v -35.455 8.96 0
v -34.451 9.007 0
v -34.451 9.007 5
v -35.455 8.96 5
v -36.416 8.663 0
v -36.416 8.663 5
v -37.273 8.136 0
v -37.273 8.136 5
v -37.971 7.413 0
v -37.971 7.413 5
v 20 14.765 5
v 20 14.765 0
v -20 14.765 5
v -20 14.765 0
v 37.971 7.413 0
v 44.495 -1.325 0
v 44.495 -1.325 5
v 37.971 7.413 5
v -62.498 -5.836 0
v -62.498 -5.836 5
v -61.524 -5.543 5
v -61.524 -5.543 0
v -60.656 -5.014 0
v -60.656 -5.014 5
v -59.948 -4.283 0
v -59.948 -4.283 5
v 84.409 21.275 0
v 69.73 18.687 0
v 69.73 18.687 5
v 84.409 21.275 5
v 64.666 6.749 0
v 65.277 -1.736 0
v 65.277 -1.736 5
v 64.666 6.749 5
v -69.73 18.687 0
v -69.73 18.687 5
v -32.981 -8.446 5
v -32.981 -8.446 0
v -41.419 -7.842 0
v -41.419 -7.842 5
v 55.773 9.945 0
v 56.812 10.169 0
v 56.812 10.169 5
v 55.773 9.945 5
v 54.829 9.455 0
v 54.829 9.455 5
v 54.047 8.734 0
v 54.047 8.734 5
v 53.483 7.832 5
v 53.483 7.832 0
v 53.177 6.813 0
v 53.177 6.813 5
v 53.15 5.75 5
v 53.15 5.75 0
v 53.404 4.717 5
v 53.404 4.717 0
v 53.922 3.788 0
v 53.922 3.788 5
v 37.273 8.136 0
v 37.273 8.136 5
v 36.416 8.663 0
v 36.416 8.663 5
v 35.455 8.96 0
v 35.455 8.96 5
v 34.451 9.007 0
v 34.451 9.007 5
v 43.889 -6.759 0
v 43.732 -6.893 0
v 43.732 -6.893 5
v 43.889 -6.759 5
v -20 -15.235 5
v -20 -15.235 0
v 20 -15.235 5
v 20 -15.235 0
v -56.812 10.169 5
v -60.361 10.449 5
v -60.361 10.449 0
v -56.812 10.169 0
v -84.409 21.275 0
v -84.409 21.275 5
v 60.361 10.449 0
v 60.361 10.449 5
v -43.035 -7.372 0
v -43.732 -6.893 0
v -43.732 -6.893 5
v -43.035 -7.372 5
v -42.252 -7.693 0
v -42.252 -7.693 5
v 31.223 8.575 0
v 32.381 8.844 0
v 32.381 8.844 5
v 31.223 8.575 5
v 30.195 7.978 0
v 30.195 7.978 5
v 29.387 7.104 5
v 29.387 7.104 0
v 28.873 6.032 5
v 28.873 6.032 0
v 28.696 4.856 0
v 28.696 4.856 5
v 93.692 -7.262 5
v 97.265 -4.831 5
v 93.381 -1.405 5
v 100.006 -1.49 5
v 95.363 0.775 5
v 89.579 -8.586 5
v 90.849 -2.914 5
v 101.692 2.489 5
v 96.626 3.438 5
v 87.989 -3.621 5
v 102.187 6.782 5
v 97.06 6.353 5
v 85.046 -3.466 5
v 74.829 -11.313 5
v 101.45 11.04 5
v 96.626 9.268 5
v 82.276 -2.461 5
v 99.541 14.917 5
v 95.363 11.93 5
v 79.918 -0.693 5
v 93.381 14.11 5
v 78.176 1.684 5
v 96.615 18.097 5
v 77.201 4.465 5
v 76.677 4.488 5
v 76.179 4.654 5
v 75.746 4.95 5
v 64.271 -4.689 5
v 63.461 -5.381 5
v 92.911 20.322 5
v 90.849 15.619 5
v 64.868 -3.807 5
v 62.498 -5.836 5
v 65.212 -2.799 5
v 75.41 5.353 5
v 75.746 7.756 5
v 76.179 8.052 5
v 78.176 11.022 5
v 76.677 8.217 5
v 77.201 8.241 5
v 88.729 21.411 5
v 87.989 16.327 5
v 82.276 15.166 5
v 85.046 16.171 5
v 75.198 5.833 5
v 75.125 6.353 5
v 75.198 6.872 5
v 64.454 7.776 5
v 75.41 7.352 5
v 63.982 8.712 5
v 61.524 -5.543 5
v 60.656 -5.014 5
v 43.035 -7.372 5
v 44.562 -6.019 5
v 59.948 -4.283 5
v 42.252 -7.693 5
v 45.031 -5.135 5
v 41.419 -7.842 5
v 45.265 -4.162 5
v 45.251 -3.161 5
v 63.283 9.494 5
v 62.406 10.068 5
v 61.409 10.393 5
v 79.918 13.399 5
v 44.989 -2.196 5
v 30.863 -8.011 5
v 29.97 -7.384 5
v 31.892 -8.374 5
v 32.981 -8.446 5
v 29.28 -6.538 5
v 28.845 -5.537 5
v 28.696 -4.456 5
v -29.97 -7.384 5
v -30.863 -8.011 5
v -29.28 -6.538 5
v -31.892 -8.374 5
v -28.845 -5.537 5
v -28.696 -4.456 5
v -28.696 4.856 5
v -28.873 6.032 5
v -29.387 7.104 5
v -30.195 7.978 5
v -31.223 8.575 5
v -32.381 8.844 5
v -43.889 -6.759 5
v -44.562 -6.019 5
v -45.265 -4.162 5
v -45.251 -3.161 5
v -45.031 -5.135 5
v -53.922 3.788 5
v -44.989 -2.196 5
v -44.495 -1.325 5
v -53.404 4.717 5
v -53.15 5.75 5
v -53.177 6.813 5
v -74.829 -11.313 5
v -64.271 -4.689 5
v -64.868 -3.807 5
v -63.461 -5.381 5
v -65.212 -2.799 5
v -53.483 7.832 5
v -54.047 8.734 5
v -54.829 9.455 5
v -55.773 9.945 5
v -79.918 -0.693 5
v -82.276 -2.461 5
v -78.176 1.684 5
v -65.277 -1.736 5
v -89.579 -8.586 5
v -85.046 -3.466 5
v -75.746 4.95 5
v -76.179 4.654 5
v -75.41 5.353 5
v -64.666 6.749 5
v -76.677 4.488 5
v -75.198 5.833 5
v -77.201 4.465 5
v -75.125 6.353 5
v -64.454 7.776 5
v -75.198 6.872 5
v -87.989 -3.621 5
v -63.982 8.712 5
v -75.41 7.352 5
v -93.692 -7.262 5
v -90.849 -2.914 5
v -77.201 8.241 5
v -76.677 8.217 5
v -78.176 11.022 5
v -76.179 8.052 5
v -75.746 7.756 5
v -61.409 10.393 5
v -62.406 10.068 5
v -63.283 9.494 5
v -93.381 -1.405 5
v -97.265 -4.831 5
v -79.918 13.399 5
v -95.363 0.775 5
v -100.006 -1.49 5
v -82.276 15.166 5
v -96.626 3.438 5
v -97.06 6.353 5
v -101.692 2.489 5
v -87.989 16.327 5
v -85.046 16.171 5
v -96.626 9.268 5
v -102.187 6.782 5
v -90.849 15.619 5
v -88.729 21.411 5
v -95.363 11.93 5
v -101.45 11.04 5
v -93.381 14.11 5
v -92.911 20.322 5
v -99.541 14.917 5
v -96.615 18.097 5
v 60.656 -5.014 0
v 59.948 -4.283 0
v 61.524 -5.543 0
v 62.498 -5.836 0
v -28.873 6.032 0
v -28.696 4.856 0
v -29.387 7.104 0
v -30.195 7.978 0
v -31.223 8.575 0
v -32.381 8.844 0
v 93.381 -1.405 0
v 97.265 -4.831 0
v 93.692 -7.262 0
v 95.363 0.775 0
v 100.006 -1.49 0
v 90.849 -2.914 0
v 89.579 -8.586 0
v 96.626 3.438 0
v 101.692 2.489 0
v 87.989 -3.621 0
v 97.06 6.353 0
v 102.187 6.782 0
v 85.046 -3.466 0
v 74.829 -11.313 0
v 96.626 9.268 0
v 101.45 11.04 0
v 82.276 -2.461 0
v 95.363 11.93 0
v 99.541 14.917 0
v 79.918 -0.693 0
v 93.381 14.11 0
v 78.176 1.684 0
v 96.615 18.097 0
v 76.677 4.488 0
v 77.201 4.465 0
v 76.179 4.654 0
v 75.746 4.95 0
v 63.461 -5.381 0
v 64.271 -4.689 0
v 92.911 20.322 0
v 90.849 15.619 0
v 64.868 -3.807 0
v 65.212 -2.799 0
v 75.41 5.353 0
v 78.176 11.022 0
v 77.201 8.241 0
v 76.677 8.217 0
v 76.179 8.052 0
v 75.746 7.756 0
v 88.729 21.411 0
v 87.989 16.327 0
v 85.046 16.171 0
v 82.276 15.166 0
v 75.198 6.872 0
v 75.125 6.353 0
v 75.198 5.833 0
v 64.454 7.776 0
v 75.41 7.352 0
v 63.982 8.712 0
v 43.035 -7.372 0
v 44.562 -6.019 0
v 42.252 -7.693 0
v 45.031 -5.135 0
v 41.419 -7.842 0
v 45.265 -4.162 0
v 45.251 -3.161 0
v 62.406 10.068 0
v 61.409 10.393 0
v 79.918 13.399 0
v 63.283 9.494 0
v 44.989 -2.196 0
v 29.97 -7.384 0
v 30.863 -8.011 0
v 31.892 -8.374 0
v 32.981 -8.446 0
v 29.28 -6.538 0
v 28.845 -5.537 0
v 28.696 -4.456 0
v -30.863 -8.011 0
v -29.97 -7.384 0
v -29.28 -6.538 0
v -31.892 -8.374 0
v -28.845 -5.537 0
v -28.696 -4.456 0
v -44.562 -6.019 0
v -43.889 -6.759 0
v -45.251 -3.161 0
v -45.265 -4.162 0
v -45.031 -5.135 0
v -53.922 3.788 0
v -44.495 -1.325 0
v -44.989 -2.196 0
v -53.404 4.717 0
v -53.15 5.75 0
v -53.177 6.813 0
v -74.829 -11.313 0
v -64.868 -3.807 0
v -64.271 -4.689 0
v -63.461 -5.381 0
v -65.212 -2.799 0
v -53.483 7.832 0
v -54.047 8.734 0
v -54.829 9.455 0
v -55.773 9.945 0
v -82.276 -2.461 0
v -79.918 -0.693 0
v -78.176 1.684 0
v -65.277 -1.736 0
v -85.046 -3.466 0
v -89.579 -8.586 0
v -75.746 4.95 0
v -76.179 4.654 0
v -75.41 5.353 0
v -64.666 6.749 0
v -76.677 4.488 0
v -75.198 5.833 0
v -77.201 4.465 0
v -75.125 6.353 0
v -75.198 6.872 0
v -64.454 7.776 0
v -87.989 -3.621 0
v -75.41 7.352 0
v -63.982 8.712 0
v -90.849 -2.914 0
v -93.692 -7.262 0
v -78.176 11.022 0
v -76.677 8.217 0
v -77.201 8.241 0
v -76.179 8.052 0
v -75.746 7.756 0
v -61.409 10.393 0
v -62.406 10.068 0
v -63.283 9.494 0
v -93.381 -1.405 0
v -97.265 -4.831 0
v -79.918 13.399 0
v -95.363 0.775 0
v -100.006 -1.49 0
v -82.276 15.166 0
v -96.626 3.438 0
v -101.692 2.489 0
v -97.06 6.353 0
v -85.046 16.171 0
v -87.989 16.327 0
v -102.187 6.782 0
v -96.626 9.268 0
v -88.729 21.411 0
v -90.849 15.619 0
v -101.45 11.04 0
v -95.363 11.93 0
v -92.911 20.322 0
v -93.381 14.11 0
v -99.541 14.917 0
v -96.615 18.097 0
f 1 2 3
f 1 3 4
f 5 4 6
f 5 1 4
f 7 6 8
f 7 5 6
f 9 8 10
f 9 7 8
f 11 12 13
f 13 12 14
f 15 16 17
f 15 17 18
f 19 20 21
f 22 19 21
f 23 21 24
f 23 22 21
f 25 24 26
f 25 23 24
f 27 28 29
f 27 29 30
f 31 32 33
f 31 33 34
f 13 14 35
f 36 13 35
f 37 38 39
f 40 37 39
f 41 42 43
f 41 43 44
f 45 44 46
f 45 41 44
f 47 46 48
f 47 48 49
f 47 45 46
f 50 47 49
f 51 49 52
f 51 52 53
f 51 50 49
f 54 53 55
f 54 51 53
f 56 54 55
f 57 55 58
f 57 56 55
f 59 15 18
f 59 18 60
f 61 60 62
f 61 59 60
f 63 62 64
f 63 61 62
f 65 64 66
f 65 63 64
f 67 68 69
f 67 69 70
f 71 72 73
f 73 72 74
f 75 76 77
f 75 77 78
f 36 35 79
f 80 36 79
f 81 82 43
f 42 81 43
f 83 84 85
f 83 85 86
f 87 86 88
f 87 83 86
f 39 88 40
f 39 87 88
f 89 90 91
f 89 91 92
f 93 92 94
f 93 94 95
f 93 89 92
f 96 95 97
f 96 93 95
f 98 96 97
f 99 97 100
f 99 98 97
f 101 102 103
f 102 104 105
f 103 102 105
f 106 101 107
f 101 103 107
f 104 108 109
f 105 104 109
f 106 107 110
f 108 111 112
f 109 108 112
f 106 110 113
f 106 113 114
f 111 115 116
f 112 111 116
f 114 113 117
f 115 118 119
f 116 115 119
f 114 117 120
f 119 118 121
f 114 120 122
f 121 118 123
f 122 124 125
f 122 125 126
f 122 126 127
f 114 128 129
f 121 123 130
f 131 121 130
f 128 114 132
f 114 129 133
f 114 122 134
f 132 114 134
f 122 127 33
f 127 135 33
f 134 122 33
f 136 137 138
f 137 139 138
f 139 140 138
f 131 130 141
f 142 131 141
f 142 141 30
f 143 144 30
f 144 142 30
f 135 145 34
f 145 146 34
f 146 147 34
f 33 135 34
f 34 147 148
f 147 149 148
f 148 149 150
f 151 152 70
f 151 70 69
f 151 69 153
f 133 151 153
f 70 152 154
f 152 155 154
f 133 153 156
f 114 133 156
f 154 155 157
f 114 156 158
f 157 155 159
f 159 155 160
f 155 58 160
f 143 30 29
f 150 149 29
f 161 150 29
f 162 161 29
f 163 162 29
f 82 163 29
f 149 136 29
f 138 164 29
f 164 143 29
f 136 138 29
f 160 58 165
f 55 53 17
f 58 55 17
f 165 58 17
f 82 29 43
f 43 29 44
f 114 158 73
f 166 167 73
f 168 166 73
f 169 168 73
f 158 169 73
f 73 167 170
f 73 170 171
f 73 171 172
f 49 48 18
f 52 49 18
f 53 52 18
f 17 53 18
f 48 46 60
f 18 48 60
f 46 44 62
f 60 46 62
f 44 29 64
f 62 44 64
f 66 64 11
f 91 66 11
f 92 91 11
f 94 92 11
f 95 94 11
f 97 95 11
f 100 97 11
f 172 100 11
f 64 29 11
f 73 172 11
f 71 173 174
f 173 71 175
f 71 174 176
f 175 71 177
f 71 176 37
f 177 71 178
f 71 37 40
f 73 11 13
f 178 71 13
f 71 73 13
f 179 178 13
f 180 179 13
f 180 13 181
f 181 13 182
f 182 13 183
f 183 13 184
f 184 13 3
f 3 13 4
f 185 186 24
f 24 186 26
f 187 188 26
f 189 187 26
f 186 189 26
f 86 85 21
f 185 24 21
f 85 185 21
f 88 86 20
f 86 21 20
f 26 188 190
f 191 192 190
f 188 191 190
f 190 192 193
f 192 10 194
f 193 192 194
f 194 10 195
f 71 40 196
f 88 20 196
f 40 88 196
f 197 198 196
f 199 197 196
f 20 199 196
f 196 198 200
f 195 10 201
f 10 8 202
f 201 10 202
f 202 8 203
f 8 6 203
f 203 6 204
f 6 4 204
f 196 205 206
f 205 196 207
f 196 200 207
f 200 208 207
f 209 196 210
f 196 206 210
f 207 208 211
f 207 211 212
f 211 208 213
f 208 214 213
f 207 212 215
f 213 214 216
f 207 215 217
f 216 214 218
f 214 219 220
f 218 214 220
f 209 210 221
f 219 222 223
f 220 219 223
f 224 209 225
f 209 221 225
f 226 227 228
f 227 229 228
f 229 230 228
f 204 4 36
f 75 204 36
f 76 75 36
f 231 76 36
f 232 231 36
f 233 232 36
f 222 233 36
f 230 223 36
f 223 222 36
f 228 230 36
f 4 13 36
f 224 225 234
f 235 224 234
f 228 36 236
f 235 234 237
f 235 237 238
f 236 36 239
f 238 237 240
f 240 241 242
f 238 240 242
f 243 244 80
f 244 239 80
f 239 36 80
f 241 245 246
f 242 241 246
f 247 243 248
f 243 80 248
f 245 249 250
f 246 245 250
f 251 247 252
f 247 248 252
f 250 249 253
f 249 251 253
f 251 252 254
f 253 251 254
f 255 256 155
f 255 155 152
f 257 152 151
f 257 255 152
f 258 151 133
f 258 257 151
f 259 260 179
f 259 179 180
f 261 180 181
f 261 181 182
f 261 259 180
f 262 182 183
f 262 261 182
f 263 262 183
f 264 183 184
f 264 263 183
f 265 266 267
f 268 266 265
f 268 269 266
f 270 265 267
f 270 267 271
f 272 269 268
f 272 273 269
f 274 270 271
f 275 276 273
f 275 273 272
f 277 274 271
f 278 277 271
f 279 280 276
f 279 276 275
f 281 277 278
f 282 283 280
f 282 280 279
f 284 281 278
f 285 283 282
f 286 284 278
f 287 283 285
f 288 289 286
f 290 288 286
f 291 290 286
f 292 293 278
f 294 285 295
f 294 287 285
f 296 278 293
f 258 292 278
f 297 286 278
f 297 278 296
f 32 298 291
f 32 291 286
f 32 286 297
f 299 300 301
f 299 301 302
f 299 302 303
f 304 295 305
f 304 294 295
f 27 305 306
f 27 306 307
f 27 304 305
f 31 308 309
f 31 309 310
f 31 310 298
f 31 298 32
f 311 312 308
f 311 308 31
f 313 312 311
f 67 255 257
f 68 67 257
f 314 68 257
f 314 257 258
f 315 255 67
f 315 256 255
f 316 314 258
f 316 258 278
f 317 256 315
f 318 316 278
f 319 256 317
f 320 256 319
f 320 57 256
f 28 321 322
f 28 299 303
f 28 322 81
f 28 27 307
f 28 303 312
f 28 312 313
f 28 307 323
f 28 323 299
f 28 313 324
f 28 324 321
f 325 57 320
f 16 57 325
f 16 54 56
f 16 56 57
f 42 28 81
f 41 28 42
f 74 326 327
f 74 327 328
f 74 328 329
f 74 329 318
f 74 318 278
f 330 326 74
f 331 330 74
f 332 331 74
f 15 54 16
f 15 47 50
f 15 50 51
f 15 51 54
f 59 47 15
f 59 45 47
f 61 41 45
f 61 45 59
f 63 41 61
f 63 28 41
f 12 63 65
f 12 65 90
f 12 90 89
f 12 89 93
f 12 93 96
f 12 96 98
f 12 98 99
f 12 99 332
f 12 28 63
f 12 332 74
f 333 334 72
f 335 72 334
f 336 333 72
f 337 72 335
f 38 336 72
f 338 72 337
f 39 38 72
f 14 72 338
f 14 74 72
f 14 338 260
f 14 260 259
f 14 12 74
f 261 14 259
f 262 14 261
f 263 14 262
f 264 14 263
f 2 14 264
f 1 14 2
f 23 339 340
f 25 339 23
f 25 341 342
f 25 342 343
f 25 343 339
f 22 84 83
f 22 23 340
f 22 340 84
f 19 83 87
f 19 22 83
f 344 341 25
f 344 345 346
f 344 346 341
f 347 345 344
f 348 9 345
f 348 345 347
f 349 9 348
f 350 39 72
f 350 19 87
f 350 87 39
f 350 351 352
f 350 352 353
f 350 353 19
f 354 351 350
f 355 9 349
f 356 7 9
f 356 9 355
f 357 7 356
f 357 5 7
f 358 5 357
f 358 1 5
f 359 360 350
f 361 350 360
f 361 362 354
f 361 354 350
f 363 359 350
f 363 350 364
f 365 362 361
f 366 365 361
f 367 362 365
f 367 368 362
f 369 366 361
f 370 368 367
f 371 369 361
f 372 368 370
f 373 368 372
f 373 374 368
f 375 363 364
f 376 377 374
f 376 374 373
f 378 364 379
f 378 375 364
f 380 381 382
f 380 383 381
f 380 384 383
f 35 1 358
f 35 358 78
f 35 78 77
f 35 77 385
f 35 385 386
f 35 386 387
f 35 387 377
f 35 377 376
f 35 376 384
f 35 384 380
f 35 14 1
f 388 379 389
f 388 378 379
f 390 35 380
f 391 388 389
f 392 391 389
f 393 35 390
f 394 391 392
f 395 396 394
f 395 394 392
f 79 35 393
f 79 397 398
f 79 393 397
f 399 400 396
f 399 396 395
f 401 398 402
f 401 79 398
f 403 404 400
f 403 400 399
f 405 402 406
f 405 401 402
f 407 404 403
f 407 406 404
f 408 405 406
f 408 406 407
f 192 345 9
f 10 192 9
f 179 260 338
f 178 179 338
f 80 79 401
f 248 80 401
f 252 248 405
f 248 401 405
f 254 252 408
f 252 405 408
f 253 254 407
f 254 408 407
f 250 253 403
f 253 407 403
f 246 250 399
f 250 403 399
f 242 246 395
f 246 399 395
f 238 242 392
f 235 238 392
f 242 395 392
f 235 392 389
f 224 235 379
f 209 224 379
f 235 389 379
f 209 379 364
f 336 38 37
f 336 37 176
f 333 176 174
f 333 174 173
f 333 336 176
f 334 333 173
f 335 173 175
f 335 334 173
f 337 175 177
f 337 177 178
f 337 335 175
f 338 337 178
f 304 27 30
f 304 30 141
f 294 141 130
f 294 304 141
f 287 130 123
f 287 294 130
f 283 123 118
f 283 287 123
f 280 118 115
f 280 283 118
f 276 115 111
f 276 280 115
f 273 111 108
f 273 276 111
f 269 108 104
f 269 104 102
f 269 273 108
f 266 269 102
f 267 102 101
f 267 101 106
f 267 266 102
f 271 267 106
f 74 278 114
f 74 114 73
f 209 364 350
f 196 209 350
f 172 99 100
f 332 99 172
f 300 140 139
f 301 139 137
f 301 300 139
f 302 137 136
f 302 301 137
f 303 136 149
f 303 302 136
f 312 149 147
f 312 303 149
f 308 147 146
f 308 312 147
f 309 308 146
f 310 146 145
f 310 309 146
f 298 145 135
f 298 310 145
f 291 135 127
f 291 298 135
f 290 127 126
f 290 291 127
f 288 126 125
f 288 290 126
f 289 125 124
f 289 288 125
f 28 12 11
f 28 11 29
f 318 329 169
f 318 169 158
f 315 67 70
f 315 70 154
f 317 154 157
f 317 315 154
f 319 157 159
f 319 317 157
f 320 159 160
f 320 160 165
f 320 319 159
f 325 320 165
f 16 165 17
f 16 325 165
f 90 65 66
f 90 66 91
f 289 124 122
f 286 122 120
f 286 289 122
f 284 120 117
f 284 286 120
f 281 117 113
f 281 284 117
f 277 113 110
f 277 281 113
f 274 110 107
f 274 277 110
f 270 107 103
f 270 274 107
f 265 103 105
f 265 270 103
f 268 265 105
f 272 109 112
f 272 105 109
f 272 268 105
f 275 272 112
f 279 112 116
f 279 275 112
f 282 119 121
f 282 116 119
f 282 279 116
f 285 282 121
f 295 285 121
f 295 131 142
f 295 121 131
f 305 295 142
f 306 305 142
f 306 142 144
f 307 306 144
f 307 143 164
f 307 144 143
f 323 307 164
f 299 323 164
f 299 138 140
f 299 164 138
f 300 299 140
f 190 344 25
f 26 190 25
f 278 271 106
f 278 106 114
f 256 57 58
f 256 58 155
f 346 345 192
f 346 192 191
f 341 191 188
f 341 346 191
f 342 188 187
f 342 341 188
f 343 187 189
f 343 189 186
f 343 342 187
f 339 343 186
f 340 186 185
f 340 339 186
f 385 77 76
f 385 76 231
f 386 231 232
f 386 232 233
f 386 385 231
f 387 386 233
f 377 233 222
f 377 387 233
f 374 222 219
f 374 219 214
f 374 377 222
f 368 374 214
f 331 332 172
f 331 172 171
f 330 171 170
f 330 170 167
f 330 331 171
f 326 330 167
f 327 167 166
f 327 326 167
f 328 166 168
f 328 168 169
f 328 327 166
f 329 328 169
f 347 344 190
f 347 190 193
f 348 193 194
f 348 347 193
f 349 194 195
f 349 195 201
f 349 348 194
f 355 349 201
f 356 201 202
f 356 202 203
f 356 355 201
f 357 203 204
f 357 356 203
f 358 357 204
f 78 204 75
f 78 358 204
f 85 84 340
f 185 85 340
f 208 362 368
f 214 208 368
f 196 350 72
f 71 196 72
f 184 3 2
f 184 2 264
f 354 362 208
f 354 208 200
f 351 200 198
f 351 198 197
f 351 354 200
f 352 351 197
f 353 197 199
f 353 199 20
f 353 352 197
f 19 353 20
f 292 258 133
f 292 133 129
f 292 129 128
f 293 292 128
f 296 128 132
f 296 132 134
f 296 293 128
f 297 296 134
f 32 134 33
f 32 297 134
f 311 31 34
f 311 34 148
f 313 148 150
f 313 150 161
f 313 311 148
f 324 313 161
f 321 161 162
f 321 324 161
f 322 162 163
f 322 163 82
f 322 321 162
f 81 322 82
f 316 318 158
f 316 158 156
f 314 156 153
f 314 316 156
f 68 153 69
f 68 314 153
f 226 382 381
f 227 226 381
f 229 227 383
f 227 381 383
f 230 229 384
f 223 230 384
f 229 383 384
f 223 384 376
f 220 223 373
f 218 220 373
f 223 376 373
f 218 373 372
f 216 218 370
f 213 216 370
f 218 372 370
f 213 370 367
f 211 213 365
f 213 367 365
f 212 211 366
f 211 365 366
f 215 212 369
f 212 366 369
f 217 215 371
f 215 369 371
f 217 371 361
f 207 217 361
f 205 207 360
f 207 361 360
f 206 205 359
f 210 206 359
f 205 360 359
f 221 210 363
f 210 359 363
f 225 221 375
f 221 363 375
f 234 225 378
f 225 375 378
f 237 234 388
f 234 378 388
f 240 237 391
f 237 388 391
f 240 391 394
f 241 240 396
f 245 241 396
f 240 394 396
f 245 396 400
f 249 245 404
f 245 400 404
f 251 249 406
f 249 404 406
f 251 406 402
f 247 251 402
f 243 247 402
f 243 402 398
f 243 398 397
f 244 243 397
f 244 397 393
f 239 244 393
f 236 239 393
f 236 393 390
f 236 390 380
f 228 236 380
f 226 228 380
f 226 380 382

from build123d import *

# Parameters (mm, degrees)
Y_KSEKLIK_EKSTR_ZYON3_DEPTH = 5
KES_EKSTR_ZYON3_DEPTH       = 16
RADYUS1_R                   = 4
RADYUS1_OF_AYNALAMA1_R      = 4


with BuildPart() as part:
    # Çizim1 → Yükseklik-Ekstrüzyon3 (new body)
    with BuildSketch(Plane.XY):
        with BuildLine():
            Line((0, 14.764846508), (20, 14.764846508))
            Line((20, 14.764846508), (69.730204906, 18.686854932))
            Line((69.730204906, 18.686854932), (84.409297917, 21.275175082))
            ThreePointArc((84.409297917, 21.275175082), (101.971159912, 8.937394133), (89.578700393, -8.585926971))
            Line((89.578700393, -8.585926971), (74.828761414, -11.313435014))
            Line((74.828761414, -11.313435014), (20, -15.235443437))
            Line((20, -15.235443437), (0, -15.235443437))
            Line((0, -15.235443437), (0, 0))
            Line((0, 0), (0, 14.764846508))
        make_face()
    y_kseklik_ekstr_zyon3 = extrude(amount=Y_KSEKLIK_EKSTR_ZYON3_DEPTH)

    # Çizim2 → Kes-Ekstrüzyon3 (cut)
    with BuildSketch(Plane.XY):
        Polygon((28.695940883, -8.752311503), (42.731699056, -7.748306299), (46.735341753, -4.32569838), (36.65049886, 9.180616861), (28.695940883, 8.553274918), align=None)
        Polygon((49.583112015, 9.598582086), (61.257040732, -6.035946189), (65.565337221, -5.727765324), (64.37597588, 10.765231948), align=None)
        with BuildLine():
            ThreePointArc((77.201041987, 4.464811576), (97.059503272, 6.35268034), (77.201041987, 8.240549104))
            ThreePointArc((77.201041987, 8.240549104), (75.125188984, 6.35268034), (77.201041987, 4.464811576))
        make_face()
    kes_ekstr_zyon3 = extrude(amount=KES_EKSTR_ZYON3_DEPTH, mode=Mode.SUBTRACT)

    # Radyus1
    # the kernel refuses this fillet: 4 mm, written as the material it adds along each edge
    with BuildSketch(Plane(origin=(28.695940883, -8.752311503, 0), x_dir=(0, 1, 0), z_dir=(0, 0, 1))) as radyus1_piece_1:
        with BuildLine():
            CenterArc((RADYUS1_R * 1.07408709953, -RADYUS1_R), RADYUS1_R, 90, 94.091510037)
            Line((RADYUS1_R * 0.0766357332147, -RADYUS1_R * 1.07134964497), (0, 0))
            Line((0, 0), (RADYUS1_R * 1.07408709953, 0))
        make_face()
    extrude(amount=5)
    with BuildSketch(Plane(origin=(64.37597588, 10.765231948, 0), x_dir=(-0.9969045315308735, -0.0786215938099059, 0), z_dir=(0, 0, 1))) as radyus1_piece_2:
        with BuildLine():
            CenterArc((RADYUS1_R * 1.0067369642, RADYUS1_R), RADYUS1_R, 179.615297698, 90.384702302)
            Line((RADYUS1_R * 0.00675950517271, RADYUS1_R * 1.00671427137), (0, 0))
            Line((0, 0), (RADYUS1_R * 1.0067369642, 0))
        make_face()
    extrude(amount=5)
    with BuildSketch(Plane(origin=(49.583112015, 9.598582086, 0), x_dir=(0.9969045315308733, 0.07862159380990602, 0), z_dir=(0, 0, 1))) as radyus1_piece_3:
        with BuildLine():
            CenterArc((RADYUS1_R * 1.81293545135, -RADYUS1_R), RADYUS1_R, 90, 122.238478949)
            Line((RADYUS1_R * 0.967100347397, -RADYUS1_R * 1.53344444595), (0, 0))
            Line((0, 0), (RADYUS1_R * 1.81293545135, 0))
        make_face()
    extrude(amount=5)
    with BuildSketch(Plane(origin=(65.565337221, -5.727765324, 0), x_dir=(-0.07192633405101899, 0.9974099470478431, 0), z_dir=(0, 0, 1))) as radyus1_piece_4:
        with BuildLine():
            CenterArc((RADYUS1_R * 1.0005783418, RADYUS1_R), RADYUS1_R, 179.966873036, 90.033126964)
            Line((RADYUS1_R * 0.000578508947597, RADYUS1_R * 1.00057817457), (0, 0))
            Line((0, 0), (RADYUS1_R * 1.0005783418, 0))
        make_face()
    extrude(amount=5)
    with BuildSketch(Plane(origin=(46.735341753, -4.32569838, 0), x_dir=(-0.5982940894650627, 0.8012765955094231, 0), z_dir=(0, 0, 1))) as radyus1_piece_5:
        with BuildLine():
            CenterArc((RADYUS1_R * 0.936136482984, RADYUS1_R), RADYUS1_R, 183.778435906, 86.221564094)
            Line((-RADYUS1_R * 0.0616898577771, RADYUS1_R * 0.934101641269), (0, 0))
            Line((0, 0), (RADYUS1_R * 0.936136482984, 0))
        make_face()
    extrude(amount=5)
    with BuildSketch(Plane(origin=(36.65049886, 9.180616861, 0), x_dir=(-0.9969045315308735, -0.07862159380990552, 0), z_dir=(0, 0, 1))) as radyus1_piece_6:
        with BuildLine():
            CenterArc((RADYUS1_R * 0.551591618585, RADYUS1_R), RADYUS1_R, 212.238478949, 57.761521051)
            Line((-RADYUS1_R * 0.294243485369, RADYUS1_R * 0.466555554046), (0, 0))
            Line((0, 0), (RADYUS1_R * 0.551591618585, 0))
        make_face()
    extrude(amount=5)
    with BuildSketch(Plane(origin=(28.695940883, 8.553274918, 0), x_dir=(0, -1, 0), z_dir=(0, 0, 1))) as radyus1_piece_7:
        with BuildLine():
            CenterArc((RADYUS1_R * 0.924239359987, RADYUS1_R), RADYUS1_R, 184.509339304, 85.490660696)
            Line((-RADYUS1_R * 0.072665171544, RADYUS1_R * 0.92137840619), (0, 0))
            Line((0, 0), (RADYUS1_R * 0.924239359987, 0))
        make_face()
    extrude(amount=5)
    with BuildSketch(Plane(origin=(42.731699056, -7.748306299, 0), x_dir=(0.7601082947002393, 0.6497964145237292, 0), z_dir=(0, 0, 1))) as radyus1_piece_8:
        with BuildLine():
            CenterArc((RADYUS1_R * 0.32911927964, RADYUS1_R), RADYUS1_R, 233.565255877, 36.434744123)
            Line((-RADYUS1_R * 0.26478758489, RADYUS1_R * 0.195466199427), (0, 0))
            Line((0, 0), (RADYUS1_R * 0.32911927964, 0))
        make_face()
    extrude(amount=5)
    with BuildSketch(Plane(origin=(61.257040732, -6.035946189, 0), x_dir=(0.9974513663147319, 0.07134964496670383, 0), z_dir=(0, 0, 1))) as radyus1_piece_9:
        with BuildLine():
            CenterArc((RADYUS1_R * 0.546845511805, RADYUS1_R), RADYUS1_R, 212.656308216, 57.343691784)
            Line((-RADYUS1_R * 0.295076994051, RADYUS1_R * 0.460401543615), (0, 0))
            Line((0, 0), (RADYUS1_R * 0.546845511805, 0))
        make_face()
    extrude(amount=5)

    # Aynalama1: Yükseklik-Ekstrüzyon3, Kes-Ekstrüzyon3 across plane
    add(y_kseklik_ekstr_zyon3.mirror(Plane(origin=(0, 0, 5), x_dir=(0, 0, 1), z_dir=(1, 0, 0))))
    add(kes_ekstr_zyon3.mirror(Plane(origin=(0, 0, 5), x_dir=(0, 0, 1), z_dir=(1, 0, 0))), mode=Mode.SUBTRACT)

    # Radyus1 of Aynalama1
    # the kernel refuses this fillet: 4 mm, written as the material it adds along each edge
    with BuildSketch(Plane(origin=(-28.695940883, -8.752311503, 0), x_dir=(-0.9974513663147319, 0.07134964496670435, 0), z_dir=(0, 0, 1))) as radyus1_of_aynalama1_piece_1:
        with BuildLine():
            CenterArc((RADYUS1_OF_AYNALAMA1_R * 1.07408709953, -RADYUS1_OF_AYNALAMA1_R), RADYUS1_OF_AYNALAMA1_R, 90, 94.091510037)
            Line((RADYUS1_OF_AYNALAMA1_R * 0.0766357332147, -RADYUS1_OF_AYNALAMA1_R * 1.07134964497), (0, 0))
            Line((0, 0), (RADYUS1_OF_AYNALAMA1_R * 1.07408709953, 0))
        make_face()
    extrude(amount=5)
    with BuildSketch(Plane(origin=(-64.37597588, 10.765231948, 0), x_dir=(-0.07192633405101888, -0.9974099470478431, 0), z_dir=(0, 0, 1))) as radyus1_of_aynalama1_piece_2:
        with BuildLine():
            CenterArc((RADYUS1_OF_AYNALAMA1_R * 1.0067369642, RADYUS1_OF_AYNALAMA1_R), RADYUS1_OF_AYNALAMA1_R, 179.615297698, 90.384702302)
            Line((RADYUS1_OF_AYNALAMA1_R * 0.00675950517271, RADYUS1_OF_AYNALAMA1_R * 1.00671427137), (0, 0))
            Line((0, 0), (RADYUS1_OF_AYNALAMA1_R * 1.0067369642, 0))
        make_face()
    extrude(amount=5)
    with BuildSketch(Plane(origin=(-49.583112015, 9.598582086, 0), x_dir=(-0.5982940894650629, -0.801276595509423, 0), z_dir=(0, 0, 1))) as radyus1_of_aynalama1_piece_3:
        with BuildLine():
            CenterArc((RADYUS1_OF_AYNALAMA1_R * 1.81293545135, -RADYUS1_OF_AYNALAMA1_R), RADYUS1_OF_AYNALAMA1_R, 90, 122.238478949)
            Line((RADYUS1_OF_AYNALAMA1_R * 0.967100347397, -RADYUS1_OF_AYNALAMA1_R * 1.53344444595), (0, 0))
            Line((0, 0), (RADYUS1_OF_AYNALAMA1_R * 1.81293545135, 0))
        make_face()
    extrude(amount=5)
    with BuildSketch(Plane(origin=(-65.565337221, -5.727765324, 0), x_dir=(0.9974513663147317, -0.07134964496670429, 0), z_dir=(0, 0, 1))) as radyus1_of_aynalama1_piece_4:
        with BuildLine():
            CenterArc((RADYUS1_OF_AYNALAMA1_R * 1.0005783418, RADYUS1_OF_AYNALAMA1_R), RADYUS1_OF_AYNALAMA1_R, 179.966873036, 90.033126964)
            Line((RADYUS1_OF_AYNALAMA1_R * 0.000578508947597, RADYUS1_OF_AYNALAMA1_R * 1.00057817457), (0, 0))
            Line((0, 0), (RADYUS1_OF_AYNALAMA1_R * 1.0005783418, 0))
        make_face()
    extrude(amount=5)
    with BuildSketch(Plane(origin=(-46.735341753, -4.32569838, 0), x_dir=(0.7601082947002414, -0.6497964145237266, 0), z_dir=(0, 0, 1))) as radyus1_of_aynalama1_piece_5:
        with BuildLine():
            CenterArc((RADYUS1_OF_AYNALAMA1_R * 0.936136482984, RADYUS1_OF_AYNALAMA1_R), RADYUS1_OF_AYNALAMA1_R, 183.778435906, 86.221564094)
            Line((-RADYUS1_OF_AYNALAMA1_R * 0.0616898577771, RADYUS1_OF_AYNALAMA1_R * 0.934101641269), (0, 0))
            Line((0, 0), (RADYUS1_OF_AYNALAMA1_R * 0.936136482984, 0))
        make_face()
    extrude(amount=5)
    with BuildSketch(Plane(origin=(-36.65049886, 9.180616861, 0), x_dir=(-0.5982940894650631, -0.8012765955094229, 0), z_dir=(0, 0, 1))) as radyus1_of_aynalama1_piece_6:
        with BuildLine():
            CenterArc((RADYUS1_OF_AYNALAMA1_R * 0.551591618585, RADYUS1_OF_AYNALAMA1_R), RADYUS1_OF_AYNALAMA1_R, 212.238478949, 57.761521051)
            Line((-RADYUS1_OF_AYNALAMA1_R * 0.294243485369, RADYUS1_OF_AYNALAMA1_R * 0.466555554046), (0, 0))
            Line((0, 0), (RADYUS1_OF_AYNALAMA1_R * 0.551591618585, 0))
        make_face()
    extrude(amount=5)
    with BuildSketch(Plane(origin=(-28.695940883, 8.553274918, 0), x_dir=(-0.9969045315308733, 0.07862159380990529, 0), z_dir=(0, 0, 1))) as radyus1_of_aynalama1_piece_7:
        with BuildLine():
            CenterArc((RADYUS1_OF_AYNALAMA1_R * 0.924239359987, RADYUS1_OF_AYNALAMA1_R), RADYUS1_OF_AYNALAMA1_R, 184.509339304, 85.490660696)
            Line((-RADYUS1_OF_AYNALAMA1_R * 0.072665171544, RADYUS1_OF_AYNALAMA1_R * 0.92137840619), (0, 0))
            Line((0, 0), (RADYUS1_OF_AYNALAMA1_R * 0.924239359987, 0))
        make_face()
    extrude(amount=5)
    with BuildSketch(Plane(origin=(-42.731699056, -7.748306299, 0), x_dir=(0.9974513663147319, -0.07134964496670414, 0), z_dir=(0, 0, 1))) as radyus1_of_aynalama1_piece_8:
        with BuildLine():
            CenterArc((RADYUS1_OF_AYNALAMA1_R * 0.32911927964, RADYUS1_OF_AYNALAMA1_R), RADYUS1_OF_AYNALAMA1_R, 233.565255877, 36.434744123)
            Line((-RADYUS1_OF_AYNALAMA1_R * 0.26478758489, RADYUS1_OF_AYNALAMA1_R * 0.195466199427), (0, 0))
            Line((0, 0), (RADYUS1_OF_AYNALAMA1_R * 0.32911927964, 0))
        make_face()
    extrude(amount=5)
    with BuildSketch(Plane(origin=(-61.257040732, -6.035946189, 0), x_dir=(0.5982940894650642, 0.8012765955094219, 0), z_dir=(0, 0, 1))) as radyus1_of_aynalama1_piece_9:
        with BuildLine():
            CenterArc((RADYUS1_OF_AYNALAMA1_R * 0.546845511805, RADYUS1_OF_AYNALAMA1_R), RADYUS1_OF_AYNALAMA1_R, 212.656308216, 57.343691784)
            Line((-RADYUS1_OF_AYNALAMA1_R * 0.295076994051, RADYUS1_OF_AYNALAMA1_R * 0.460401543615), (0, 0))
            Line((0, 0), (RADYUS1_OF_AYNALAMA1_R * 0.546845511805, 0))
        make_face()
    extrude(amount=5)


solid = part.part
